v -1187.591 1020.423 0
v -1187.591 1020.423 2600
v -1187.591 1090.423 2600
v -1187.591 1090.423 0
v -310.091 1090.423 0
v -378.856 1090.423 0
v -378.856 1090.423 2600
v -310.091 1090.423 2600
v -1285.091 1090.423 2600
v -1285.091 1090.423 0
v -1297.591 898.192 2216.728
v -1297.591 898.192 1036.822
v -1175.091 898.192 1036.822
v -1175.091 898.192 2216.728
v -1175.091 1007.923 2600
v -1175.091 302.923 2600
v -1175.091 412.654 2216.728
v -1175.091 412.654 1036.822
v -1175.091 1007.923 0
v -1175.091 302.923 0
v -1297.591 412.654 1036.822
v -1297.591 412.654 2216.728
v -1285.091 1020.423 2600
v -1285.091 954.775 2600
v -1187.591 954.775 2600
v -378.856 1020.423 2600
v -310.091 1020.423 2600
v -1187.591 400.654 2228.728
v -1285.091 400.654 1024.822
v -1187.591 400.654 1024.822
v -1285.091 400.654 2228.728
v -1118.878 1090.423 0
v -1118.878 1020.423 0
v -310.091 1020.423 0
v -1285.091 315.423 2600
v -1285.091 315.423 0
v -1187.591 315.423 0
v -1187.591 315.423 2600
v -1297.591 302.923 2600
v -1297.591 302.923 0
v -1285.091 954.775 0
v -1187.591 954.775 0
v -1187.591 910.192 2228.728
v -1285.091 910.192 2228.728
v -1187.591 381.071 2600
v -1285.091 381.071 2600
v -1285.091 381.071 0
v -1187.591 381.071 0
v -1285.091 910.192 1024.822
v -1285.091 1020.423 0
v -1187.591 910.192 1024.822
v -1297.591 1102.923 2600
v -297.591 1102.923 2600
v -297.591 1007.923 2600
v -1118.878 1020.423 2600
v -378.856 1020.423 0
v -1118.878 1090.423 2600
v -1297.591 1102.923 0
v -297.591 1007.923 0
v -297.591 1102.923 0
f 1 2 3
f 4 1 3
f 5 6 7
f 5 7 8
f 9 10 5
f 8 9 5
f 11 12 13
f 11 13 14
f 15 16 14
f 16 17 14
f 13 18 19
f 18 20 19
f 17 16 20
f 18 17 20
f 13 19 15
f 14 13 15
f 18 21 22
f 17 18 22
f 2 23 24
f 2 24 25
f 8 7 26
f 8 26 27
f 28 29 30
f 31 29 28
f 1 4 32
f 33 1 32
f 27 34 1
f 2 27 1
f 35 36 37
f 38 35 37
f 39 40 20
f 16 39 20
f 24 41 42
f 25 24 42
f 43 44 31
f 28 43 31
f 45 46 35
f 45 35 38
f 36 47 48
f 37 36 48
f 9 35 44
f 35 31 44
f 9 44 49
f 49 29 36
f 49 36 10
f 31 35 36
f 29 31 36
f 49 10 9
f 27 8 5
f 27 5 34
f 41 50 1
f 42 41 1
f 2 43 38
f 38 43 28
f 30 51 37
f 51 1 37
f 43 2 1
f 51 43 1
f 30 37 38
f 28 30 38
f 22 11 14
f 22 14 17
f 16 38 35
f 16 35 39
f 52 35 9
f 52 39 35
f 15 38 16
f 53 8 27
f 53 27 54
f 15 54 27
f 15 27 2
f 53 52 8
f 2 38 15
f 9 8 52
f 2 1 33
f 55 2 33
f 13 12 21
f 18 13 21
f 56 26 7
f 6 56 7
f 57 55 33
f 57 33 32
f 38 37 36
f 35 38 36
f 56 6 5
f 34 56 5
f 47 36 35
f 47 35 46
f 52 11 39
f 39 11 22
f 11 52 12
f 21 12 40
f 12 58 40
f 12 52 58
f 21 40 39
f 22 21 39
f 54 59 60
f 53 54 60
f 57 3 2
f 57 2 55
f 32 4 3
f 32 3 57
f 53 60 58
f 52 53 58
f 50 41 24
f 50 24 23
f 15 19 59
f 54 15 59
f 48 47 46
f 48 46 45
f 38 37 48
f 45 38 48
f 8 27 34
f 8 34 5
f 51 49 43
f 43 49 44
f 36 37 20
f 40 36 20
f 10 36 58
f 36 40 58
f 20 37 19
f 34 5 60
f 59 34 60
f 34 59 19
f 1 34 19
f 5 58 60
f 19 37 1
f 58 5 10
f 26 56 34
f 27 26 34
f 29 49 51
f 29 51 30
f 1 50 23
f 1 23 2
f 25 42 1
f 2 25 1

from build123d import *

# Parameters (mm, degrees)
F1_DEPTH = 2600
F0_W     = 97.5000073
F0_H     = 65.6477120058
F2_DEPTH = 2600
F0_W_2   = 68.7130760655
F0_H_2   = 70
F0_W_3   = 68.7645851583
F3_W     = 509.5384602817
F3_H     = 1203.9053440094
F4_DEPTH = 122.5010073
F5_W     = 509.5384602817
F5_H     = 1203.9053440094
F5_W_2   = 485.5384602817
F5_H_2   = 1179.9053440094
F6_DEPTH = 122.5000073


with BuildPart() as f1:
    # F0 (on Top) → F1 (new body)
    with BuildSketch(Plane.XY):
        Polygon((-1297.5909710913, 302.9231998785), (-1175.0909637913, 302.9231998785), (-1175.0909637913, 1007.9231998785), (-297.5909710913, 1007.9231998785), (-297.5909710913, 1102.9231998785), (-1297.5909710913, 1102.9231998785), align=None)
        Polygon((-1118.8778877258, 1020.4231998785), (-1187.5909637913, 1020.4231998785), (-1187.5909637913, 954.7754878728), (-1187.5909637913, 381.0709118843), (-1187.5909637913, 315.4231998785), (-1285.0909710913, 315.4231998785), (-1285.0909710913, 381.0709118843), (-1285.0909710913, 954.7754878728), (-1285.0909710913, 1020.4231998785), (-1285.0909710913, 1090.4231998785), (-1187.5909637913, 1090.4231998785), (-1118.8778877258, 1090.4231998785), (-378.8555562496, 1090.4231998785), (-310.0909710913, 1090.4231998785), (-310.0909710913, 1020.4231998785), (-378.8555562496, 1020.4231998785), align=None, mode=Mode.SUBTRACT)
    extrude(amount=F1_DEPTH)

    # F3 (on face) → F4 (cut, through all)
    with BuildSketch(Plane.YZ.offset(-1175.0909637913)):
        with Locations((655.4231998785, 1626.7749071121)):
            Rectangle(F3_W, F3_H)
    extrude(amount=-F4_DEPTH, mode=Mode.SUBTRACT)

    # F5 (on face) → F6 (join, through all)
    with BuildSketch(Plane(origin=(-1297.5909710913, 0, 0), x_dir=(0, -1, 0), z_dir=(-1, 0, 0))):
        with Locations((-655.4231998785, 1626.7749071121)):
            Rectangle(F5_W, F5_H)
        with Locations((-655.4231998785, 1626.7749071121)):
            Rectangle(F5_W_2, F5_H_2, mode=Mode.SUBTRACT)
    extrude(amount=-F6_DEPTH)


with BuildPart() as f2:
    # F0 (on Top) → F2 (new body)
    with BuildSketch(Plane.XY):
        with Locations((-1236.3409674413, 348.2470558814)):
            Rectangle(F0_W, F0_H)
    extrude(amount=F2_DEPTH)


with BuildPart() as f2b:
    # F0 (on Top) → F2, piece 2 (new body)
    with BuildSketch(Plane.XY):
        with Locations((-1236.3409674413, 987.5993438757)):
            Rectangle(F0_W, F0_H)
    extrude(amount=F2_DEPTH)


with BuildPart() as f2c:
    # F0 (on Top) → F2, piece 3 (new body)
    with BuildSketch(Plane.XY):
        with Locations((-1153.2344257586, 1055.4231998785)):
            Rectangle(F0_W_2, F0_H_2)
    extrude(amount=F2_DEPTH)


with BuildPart() as f2d:
    # F0 (on Top) → F2, piece 4 (new body)
    with BuildSketch(Plane.XY):
        with Locations((-344.4732636705, 1055.4231998785)):
            Rectangle(F0_W_3, F0_H_2)
    extrude(amount=F2_DEPTH)


solid = Compound([f1.part, f2.part, f2b.part, f2c.part, f2d.part])
